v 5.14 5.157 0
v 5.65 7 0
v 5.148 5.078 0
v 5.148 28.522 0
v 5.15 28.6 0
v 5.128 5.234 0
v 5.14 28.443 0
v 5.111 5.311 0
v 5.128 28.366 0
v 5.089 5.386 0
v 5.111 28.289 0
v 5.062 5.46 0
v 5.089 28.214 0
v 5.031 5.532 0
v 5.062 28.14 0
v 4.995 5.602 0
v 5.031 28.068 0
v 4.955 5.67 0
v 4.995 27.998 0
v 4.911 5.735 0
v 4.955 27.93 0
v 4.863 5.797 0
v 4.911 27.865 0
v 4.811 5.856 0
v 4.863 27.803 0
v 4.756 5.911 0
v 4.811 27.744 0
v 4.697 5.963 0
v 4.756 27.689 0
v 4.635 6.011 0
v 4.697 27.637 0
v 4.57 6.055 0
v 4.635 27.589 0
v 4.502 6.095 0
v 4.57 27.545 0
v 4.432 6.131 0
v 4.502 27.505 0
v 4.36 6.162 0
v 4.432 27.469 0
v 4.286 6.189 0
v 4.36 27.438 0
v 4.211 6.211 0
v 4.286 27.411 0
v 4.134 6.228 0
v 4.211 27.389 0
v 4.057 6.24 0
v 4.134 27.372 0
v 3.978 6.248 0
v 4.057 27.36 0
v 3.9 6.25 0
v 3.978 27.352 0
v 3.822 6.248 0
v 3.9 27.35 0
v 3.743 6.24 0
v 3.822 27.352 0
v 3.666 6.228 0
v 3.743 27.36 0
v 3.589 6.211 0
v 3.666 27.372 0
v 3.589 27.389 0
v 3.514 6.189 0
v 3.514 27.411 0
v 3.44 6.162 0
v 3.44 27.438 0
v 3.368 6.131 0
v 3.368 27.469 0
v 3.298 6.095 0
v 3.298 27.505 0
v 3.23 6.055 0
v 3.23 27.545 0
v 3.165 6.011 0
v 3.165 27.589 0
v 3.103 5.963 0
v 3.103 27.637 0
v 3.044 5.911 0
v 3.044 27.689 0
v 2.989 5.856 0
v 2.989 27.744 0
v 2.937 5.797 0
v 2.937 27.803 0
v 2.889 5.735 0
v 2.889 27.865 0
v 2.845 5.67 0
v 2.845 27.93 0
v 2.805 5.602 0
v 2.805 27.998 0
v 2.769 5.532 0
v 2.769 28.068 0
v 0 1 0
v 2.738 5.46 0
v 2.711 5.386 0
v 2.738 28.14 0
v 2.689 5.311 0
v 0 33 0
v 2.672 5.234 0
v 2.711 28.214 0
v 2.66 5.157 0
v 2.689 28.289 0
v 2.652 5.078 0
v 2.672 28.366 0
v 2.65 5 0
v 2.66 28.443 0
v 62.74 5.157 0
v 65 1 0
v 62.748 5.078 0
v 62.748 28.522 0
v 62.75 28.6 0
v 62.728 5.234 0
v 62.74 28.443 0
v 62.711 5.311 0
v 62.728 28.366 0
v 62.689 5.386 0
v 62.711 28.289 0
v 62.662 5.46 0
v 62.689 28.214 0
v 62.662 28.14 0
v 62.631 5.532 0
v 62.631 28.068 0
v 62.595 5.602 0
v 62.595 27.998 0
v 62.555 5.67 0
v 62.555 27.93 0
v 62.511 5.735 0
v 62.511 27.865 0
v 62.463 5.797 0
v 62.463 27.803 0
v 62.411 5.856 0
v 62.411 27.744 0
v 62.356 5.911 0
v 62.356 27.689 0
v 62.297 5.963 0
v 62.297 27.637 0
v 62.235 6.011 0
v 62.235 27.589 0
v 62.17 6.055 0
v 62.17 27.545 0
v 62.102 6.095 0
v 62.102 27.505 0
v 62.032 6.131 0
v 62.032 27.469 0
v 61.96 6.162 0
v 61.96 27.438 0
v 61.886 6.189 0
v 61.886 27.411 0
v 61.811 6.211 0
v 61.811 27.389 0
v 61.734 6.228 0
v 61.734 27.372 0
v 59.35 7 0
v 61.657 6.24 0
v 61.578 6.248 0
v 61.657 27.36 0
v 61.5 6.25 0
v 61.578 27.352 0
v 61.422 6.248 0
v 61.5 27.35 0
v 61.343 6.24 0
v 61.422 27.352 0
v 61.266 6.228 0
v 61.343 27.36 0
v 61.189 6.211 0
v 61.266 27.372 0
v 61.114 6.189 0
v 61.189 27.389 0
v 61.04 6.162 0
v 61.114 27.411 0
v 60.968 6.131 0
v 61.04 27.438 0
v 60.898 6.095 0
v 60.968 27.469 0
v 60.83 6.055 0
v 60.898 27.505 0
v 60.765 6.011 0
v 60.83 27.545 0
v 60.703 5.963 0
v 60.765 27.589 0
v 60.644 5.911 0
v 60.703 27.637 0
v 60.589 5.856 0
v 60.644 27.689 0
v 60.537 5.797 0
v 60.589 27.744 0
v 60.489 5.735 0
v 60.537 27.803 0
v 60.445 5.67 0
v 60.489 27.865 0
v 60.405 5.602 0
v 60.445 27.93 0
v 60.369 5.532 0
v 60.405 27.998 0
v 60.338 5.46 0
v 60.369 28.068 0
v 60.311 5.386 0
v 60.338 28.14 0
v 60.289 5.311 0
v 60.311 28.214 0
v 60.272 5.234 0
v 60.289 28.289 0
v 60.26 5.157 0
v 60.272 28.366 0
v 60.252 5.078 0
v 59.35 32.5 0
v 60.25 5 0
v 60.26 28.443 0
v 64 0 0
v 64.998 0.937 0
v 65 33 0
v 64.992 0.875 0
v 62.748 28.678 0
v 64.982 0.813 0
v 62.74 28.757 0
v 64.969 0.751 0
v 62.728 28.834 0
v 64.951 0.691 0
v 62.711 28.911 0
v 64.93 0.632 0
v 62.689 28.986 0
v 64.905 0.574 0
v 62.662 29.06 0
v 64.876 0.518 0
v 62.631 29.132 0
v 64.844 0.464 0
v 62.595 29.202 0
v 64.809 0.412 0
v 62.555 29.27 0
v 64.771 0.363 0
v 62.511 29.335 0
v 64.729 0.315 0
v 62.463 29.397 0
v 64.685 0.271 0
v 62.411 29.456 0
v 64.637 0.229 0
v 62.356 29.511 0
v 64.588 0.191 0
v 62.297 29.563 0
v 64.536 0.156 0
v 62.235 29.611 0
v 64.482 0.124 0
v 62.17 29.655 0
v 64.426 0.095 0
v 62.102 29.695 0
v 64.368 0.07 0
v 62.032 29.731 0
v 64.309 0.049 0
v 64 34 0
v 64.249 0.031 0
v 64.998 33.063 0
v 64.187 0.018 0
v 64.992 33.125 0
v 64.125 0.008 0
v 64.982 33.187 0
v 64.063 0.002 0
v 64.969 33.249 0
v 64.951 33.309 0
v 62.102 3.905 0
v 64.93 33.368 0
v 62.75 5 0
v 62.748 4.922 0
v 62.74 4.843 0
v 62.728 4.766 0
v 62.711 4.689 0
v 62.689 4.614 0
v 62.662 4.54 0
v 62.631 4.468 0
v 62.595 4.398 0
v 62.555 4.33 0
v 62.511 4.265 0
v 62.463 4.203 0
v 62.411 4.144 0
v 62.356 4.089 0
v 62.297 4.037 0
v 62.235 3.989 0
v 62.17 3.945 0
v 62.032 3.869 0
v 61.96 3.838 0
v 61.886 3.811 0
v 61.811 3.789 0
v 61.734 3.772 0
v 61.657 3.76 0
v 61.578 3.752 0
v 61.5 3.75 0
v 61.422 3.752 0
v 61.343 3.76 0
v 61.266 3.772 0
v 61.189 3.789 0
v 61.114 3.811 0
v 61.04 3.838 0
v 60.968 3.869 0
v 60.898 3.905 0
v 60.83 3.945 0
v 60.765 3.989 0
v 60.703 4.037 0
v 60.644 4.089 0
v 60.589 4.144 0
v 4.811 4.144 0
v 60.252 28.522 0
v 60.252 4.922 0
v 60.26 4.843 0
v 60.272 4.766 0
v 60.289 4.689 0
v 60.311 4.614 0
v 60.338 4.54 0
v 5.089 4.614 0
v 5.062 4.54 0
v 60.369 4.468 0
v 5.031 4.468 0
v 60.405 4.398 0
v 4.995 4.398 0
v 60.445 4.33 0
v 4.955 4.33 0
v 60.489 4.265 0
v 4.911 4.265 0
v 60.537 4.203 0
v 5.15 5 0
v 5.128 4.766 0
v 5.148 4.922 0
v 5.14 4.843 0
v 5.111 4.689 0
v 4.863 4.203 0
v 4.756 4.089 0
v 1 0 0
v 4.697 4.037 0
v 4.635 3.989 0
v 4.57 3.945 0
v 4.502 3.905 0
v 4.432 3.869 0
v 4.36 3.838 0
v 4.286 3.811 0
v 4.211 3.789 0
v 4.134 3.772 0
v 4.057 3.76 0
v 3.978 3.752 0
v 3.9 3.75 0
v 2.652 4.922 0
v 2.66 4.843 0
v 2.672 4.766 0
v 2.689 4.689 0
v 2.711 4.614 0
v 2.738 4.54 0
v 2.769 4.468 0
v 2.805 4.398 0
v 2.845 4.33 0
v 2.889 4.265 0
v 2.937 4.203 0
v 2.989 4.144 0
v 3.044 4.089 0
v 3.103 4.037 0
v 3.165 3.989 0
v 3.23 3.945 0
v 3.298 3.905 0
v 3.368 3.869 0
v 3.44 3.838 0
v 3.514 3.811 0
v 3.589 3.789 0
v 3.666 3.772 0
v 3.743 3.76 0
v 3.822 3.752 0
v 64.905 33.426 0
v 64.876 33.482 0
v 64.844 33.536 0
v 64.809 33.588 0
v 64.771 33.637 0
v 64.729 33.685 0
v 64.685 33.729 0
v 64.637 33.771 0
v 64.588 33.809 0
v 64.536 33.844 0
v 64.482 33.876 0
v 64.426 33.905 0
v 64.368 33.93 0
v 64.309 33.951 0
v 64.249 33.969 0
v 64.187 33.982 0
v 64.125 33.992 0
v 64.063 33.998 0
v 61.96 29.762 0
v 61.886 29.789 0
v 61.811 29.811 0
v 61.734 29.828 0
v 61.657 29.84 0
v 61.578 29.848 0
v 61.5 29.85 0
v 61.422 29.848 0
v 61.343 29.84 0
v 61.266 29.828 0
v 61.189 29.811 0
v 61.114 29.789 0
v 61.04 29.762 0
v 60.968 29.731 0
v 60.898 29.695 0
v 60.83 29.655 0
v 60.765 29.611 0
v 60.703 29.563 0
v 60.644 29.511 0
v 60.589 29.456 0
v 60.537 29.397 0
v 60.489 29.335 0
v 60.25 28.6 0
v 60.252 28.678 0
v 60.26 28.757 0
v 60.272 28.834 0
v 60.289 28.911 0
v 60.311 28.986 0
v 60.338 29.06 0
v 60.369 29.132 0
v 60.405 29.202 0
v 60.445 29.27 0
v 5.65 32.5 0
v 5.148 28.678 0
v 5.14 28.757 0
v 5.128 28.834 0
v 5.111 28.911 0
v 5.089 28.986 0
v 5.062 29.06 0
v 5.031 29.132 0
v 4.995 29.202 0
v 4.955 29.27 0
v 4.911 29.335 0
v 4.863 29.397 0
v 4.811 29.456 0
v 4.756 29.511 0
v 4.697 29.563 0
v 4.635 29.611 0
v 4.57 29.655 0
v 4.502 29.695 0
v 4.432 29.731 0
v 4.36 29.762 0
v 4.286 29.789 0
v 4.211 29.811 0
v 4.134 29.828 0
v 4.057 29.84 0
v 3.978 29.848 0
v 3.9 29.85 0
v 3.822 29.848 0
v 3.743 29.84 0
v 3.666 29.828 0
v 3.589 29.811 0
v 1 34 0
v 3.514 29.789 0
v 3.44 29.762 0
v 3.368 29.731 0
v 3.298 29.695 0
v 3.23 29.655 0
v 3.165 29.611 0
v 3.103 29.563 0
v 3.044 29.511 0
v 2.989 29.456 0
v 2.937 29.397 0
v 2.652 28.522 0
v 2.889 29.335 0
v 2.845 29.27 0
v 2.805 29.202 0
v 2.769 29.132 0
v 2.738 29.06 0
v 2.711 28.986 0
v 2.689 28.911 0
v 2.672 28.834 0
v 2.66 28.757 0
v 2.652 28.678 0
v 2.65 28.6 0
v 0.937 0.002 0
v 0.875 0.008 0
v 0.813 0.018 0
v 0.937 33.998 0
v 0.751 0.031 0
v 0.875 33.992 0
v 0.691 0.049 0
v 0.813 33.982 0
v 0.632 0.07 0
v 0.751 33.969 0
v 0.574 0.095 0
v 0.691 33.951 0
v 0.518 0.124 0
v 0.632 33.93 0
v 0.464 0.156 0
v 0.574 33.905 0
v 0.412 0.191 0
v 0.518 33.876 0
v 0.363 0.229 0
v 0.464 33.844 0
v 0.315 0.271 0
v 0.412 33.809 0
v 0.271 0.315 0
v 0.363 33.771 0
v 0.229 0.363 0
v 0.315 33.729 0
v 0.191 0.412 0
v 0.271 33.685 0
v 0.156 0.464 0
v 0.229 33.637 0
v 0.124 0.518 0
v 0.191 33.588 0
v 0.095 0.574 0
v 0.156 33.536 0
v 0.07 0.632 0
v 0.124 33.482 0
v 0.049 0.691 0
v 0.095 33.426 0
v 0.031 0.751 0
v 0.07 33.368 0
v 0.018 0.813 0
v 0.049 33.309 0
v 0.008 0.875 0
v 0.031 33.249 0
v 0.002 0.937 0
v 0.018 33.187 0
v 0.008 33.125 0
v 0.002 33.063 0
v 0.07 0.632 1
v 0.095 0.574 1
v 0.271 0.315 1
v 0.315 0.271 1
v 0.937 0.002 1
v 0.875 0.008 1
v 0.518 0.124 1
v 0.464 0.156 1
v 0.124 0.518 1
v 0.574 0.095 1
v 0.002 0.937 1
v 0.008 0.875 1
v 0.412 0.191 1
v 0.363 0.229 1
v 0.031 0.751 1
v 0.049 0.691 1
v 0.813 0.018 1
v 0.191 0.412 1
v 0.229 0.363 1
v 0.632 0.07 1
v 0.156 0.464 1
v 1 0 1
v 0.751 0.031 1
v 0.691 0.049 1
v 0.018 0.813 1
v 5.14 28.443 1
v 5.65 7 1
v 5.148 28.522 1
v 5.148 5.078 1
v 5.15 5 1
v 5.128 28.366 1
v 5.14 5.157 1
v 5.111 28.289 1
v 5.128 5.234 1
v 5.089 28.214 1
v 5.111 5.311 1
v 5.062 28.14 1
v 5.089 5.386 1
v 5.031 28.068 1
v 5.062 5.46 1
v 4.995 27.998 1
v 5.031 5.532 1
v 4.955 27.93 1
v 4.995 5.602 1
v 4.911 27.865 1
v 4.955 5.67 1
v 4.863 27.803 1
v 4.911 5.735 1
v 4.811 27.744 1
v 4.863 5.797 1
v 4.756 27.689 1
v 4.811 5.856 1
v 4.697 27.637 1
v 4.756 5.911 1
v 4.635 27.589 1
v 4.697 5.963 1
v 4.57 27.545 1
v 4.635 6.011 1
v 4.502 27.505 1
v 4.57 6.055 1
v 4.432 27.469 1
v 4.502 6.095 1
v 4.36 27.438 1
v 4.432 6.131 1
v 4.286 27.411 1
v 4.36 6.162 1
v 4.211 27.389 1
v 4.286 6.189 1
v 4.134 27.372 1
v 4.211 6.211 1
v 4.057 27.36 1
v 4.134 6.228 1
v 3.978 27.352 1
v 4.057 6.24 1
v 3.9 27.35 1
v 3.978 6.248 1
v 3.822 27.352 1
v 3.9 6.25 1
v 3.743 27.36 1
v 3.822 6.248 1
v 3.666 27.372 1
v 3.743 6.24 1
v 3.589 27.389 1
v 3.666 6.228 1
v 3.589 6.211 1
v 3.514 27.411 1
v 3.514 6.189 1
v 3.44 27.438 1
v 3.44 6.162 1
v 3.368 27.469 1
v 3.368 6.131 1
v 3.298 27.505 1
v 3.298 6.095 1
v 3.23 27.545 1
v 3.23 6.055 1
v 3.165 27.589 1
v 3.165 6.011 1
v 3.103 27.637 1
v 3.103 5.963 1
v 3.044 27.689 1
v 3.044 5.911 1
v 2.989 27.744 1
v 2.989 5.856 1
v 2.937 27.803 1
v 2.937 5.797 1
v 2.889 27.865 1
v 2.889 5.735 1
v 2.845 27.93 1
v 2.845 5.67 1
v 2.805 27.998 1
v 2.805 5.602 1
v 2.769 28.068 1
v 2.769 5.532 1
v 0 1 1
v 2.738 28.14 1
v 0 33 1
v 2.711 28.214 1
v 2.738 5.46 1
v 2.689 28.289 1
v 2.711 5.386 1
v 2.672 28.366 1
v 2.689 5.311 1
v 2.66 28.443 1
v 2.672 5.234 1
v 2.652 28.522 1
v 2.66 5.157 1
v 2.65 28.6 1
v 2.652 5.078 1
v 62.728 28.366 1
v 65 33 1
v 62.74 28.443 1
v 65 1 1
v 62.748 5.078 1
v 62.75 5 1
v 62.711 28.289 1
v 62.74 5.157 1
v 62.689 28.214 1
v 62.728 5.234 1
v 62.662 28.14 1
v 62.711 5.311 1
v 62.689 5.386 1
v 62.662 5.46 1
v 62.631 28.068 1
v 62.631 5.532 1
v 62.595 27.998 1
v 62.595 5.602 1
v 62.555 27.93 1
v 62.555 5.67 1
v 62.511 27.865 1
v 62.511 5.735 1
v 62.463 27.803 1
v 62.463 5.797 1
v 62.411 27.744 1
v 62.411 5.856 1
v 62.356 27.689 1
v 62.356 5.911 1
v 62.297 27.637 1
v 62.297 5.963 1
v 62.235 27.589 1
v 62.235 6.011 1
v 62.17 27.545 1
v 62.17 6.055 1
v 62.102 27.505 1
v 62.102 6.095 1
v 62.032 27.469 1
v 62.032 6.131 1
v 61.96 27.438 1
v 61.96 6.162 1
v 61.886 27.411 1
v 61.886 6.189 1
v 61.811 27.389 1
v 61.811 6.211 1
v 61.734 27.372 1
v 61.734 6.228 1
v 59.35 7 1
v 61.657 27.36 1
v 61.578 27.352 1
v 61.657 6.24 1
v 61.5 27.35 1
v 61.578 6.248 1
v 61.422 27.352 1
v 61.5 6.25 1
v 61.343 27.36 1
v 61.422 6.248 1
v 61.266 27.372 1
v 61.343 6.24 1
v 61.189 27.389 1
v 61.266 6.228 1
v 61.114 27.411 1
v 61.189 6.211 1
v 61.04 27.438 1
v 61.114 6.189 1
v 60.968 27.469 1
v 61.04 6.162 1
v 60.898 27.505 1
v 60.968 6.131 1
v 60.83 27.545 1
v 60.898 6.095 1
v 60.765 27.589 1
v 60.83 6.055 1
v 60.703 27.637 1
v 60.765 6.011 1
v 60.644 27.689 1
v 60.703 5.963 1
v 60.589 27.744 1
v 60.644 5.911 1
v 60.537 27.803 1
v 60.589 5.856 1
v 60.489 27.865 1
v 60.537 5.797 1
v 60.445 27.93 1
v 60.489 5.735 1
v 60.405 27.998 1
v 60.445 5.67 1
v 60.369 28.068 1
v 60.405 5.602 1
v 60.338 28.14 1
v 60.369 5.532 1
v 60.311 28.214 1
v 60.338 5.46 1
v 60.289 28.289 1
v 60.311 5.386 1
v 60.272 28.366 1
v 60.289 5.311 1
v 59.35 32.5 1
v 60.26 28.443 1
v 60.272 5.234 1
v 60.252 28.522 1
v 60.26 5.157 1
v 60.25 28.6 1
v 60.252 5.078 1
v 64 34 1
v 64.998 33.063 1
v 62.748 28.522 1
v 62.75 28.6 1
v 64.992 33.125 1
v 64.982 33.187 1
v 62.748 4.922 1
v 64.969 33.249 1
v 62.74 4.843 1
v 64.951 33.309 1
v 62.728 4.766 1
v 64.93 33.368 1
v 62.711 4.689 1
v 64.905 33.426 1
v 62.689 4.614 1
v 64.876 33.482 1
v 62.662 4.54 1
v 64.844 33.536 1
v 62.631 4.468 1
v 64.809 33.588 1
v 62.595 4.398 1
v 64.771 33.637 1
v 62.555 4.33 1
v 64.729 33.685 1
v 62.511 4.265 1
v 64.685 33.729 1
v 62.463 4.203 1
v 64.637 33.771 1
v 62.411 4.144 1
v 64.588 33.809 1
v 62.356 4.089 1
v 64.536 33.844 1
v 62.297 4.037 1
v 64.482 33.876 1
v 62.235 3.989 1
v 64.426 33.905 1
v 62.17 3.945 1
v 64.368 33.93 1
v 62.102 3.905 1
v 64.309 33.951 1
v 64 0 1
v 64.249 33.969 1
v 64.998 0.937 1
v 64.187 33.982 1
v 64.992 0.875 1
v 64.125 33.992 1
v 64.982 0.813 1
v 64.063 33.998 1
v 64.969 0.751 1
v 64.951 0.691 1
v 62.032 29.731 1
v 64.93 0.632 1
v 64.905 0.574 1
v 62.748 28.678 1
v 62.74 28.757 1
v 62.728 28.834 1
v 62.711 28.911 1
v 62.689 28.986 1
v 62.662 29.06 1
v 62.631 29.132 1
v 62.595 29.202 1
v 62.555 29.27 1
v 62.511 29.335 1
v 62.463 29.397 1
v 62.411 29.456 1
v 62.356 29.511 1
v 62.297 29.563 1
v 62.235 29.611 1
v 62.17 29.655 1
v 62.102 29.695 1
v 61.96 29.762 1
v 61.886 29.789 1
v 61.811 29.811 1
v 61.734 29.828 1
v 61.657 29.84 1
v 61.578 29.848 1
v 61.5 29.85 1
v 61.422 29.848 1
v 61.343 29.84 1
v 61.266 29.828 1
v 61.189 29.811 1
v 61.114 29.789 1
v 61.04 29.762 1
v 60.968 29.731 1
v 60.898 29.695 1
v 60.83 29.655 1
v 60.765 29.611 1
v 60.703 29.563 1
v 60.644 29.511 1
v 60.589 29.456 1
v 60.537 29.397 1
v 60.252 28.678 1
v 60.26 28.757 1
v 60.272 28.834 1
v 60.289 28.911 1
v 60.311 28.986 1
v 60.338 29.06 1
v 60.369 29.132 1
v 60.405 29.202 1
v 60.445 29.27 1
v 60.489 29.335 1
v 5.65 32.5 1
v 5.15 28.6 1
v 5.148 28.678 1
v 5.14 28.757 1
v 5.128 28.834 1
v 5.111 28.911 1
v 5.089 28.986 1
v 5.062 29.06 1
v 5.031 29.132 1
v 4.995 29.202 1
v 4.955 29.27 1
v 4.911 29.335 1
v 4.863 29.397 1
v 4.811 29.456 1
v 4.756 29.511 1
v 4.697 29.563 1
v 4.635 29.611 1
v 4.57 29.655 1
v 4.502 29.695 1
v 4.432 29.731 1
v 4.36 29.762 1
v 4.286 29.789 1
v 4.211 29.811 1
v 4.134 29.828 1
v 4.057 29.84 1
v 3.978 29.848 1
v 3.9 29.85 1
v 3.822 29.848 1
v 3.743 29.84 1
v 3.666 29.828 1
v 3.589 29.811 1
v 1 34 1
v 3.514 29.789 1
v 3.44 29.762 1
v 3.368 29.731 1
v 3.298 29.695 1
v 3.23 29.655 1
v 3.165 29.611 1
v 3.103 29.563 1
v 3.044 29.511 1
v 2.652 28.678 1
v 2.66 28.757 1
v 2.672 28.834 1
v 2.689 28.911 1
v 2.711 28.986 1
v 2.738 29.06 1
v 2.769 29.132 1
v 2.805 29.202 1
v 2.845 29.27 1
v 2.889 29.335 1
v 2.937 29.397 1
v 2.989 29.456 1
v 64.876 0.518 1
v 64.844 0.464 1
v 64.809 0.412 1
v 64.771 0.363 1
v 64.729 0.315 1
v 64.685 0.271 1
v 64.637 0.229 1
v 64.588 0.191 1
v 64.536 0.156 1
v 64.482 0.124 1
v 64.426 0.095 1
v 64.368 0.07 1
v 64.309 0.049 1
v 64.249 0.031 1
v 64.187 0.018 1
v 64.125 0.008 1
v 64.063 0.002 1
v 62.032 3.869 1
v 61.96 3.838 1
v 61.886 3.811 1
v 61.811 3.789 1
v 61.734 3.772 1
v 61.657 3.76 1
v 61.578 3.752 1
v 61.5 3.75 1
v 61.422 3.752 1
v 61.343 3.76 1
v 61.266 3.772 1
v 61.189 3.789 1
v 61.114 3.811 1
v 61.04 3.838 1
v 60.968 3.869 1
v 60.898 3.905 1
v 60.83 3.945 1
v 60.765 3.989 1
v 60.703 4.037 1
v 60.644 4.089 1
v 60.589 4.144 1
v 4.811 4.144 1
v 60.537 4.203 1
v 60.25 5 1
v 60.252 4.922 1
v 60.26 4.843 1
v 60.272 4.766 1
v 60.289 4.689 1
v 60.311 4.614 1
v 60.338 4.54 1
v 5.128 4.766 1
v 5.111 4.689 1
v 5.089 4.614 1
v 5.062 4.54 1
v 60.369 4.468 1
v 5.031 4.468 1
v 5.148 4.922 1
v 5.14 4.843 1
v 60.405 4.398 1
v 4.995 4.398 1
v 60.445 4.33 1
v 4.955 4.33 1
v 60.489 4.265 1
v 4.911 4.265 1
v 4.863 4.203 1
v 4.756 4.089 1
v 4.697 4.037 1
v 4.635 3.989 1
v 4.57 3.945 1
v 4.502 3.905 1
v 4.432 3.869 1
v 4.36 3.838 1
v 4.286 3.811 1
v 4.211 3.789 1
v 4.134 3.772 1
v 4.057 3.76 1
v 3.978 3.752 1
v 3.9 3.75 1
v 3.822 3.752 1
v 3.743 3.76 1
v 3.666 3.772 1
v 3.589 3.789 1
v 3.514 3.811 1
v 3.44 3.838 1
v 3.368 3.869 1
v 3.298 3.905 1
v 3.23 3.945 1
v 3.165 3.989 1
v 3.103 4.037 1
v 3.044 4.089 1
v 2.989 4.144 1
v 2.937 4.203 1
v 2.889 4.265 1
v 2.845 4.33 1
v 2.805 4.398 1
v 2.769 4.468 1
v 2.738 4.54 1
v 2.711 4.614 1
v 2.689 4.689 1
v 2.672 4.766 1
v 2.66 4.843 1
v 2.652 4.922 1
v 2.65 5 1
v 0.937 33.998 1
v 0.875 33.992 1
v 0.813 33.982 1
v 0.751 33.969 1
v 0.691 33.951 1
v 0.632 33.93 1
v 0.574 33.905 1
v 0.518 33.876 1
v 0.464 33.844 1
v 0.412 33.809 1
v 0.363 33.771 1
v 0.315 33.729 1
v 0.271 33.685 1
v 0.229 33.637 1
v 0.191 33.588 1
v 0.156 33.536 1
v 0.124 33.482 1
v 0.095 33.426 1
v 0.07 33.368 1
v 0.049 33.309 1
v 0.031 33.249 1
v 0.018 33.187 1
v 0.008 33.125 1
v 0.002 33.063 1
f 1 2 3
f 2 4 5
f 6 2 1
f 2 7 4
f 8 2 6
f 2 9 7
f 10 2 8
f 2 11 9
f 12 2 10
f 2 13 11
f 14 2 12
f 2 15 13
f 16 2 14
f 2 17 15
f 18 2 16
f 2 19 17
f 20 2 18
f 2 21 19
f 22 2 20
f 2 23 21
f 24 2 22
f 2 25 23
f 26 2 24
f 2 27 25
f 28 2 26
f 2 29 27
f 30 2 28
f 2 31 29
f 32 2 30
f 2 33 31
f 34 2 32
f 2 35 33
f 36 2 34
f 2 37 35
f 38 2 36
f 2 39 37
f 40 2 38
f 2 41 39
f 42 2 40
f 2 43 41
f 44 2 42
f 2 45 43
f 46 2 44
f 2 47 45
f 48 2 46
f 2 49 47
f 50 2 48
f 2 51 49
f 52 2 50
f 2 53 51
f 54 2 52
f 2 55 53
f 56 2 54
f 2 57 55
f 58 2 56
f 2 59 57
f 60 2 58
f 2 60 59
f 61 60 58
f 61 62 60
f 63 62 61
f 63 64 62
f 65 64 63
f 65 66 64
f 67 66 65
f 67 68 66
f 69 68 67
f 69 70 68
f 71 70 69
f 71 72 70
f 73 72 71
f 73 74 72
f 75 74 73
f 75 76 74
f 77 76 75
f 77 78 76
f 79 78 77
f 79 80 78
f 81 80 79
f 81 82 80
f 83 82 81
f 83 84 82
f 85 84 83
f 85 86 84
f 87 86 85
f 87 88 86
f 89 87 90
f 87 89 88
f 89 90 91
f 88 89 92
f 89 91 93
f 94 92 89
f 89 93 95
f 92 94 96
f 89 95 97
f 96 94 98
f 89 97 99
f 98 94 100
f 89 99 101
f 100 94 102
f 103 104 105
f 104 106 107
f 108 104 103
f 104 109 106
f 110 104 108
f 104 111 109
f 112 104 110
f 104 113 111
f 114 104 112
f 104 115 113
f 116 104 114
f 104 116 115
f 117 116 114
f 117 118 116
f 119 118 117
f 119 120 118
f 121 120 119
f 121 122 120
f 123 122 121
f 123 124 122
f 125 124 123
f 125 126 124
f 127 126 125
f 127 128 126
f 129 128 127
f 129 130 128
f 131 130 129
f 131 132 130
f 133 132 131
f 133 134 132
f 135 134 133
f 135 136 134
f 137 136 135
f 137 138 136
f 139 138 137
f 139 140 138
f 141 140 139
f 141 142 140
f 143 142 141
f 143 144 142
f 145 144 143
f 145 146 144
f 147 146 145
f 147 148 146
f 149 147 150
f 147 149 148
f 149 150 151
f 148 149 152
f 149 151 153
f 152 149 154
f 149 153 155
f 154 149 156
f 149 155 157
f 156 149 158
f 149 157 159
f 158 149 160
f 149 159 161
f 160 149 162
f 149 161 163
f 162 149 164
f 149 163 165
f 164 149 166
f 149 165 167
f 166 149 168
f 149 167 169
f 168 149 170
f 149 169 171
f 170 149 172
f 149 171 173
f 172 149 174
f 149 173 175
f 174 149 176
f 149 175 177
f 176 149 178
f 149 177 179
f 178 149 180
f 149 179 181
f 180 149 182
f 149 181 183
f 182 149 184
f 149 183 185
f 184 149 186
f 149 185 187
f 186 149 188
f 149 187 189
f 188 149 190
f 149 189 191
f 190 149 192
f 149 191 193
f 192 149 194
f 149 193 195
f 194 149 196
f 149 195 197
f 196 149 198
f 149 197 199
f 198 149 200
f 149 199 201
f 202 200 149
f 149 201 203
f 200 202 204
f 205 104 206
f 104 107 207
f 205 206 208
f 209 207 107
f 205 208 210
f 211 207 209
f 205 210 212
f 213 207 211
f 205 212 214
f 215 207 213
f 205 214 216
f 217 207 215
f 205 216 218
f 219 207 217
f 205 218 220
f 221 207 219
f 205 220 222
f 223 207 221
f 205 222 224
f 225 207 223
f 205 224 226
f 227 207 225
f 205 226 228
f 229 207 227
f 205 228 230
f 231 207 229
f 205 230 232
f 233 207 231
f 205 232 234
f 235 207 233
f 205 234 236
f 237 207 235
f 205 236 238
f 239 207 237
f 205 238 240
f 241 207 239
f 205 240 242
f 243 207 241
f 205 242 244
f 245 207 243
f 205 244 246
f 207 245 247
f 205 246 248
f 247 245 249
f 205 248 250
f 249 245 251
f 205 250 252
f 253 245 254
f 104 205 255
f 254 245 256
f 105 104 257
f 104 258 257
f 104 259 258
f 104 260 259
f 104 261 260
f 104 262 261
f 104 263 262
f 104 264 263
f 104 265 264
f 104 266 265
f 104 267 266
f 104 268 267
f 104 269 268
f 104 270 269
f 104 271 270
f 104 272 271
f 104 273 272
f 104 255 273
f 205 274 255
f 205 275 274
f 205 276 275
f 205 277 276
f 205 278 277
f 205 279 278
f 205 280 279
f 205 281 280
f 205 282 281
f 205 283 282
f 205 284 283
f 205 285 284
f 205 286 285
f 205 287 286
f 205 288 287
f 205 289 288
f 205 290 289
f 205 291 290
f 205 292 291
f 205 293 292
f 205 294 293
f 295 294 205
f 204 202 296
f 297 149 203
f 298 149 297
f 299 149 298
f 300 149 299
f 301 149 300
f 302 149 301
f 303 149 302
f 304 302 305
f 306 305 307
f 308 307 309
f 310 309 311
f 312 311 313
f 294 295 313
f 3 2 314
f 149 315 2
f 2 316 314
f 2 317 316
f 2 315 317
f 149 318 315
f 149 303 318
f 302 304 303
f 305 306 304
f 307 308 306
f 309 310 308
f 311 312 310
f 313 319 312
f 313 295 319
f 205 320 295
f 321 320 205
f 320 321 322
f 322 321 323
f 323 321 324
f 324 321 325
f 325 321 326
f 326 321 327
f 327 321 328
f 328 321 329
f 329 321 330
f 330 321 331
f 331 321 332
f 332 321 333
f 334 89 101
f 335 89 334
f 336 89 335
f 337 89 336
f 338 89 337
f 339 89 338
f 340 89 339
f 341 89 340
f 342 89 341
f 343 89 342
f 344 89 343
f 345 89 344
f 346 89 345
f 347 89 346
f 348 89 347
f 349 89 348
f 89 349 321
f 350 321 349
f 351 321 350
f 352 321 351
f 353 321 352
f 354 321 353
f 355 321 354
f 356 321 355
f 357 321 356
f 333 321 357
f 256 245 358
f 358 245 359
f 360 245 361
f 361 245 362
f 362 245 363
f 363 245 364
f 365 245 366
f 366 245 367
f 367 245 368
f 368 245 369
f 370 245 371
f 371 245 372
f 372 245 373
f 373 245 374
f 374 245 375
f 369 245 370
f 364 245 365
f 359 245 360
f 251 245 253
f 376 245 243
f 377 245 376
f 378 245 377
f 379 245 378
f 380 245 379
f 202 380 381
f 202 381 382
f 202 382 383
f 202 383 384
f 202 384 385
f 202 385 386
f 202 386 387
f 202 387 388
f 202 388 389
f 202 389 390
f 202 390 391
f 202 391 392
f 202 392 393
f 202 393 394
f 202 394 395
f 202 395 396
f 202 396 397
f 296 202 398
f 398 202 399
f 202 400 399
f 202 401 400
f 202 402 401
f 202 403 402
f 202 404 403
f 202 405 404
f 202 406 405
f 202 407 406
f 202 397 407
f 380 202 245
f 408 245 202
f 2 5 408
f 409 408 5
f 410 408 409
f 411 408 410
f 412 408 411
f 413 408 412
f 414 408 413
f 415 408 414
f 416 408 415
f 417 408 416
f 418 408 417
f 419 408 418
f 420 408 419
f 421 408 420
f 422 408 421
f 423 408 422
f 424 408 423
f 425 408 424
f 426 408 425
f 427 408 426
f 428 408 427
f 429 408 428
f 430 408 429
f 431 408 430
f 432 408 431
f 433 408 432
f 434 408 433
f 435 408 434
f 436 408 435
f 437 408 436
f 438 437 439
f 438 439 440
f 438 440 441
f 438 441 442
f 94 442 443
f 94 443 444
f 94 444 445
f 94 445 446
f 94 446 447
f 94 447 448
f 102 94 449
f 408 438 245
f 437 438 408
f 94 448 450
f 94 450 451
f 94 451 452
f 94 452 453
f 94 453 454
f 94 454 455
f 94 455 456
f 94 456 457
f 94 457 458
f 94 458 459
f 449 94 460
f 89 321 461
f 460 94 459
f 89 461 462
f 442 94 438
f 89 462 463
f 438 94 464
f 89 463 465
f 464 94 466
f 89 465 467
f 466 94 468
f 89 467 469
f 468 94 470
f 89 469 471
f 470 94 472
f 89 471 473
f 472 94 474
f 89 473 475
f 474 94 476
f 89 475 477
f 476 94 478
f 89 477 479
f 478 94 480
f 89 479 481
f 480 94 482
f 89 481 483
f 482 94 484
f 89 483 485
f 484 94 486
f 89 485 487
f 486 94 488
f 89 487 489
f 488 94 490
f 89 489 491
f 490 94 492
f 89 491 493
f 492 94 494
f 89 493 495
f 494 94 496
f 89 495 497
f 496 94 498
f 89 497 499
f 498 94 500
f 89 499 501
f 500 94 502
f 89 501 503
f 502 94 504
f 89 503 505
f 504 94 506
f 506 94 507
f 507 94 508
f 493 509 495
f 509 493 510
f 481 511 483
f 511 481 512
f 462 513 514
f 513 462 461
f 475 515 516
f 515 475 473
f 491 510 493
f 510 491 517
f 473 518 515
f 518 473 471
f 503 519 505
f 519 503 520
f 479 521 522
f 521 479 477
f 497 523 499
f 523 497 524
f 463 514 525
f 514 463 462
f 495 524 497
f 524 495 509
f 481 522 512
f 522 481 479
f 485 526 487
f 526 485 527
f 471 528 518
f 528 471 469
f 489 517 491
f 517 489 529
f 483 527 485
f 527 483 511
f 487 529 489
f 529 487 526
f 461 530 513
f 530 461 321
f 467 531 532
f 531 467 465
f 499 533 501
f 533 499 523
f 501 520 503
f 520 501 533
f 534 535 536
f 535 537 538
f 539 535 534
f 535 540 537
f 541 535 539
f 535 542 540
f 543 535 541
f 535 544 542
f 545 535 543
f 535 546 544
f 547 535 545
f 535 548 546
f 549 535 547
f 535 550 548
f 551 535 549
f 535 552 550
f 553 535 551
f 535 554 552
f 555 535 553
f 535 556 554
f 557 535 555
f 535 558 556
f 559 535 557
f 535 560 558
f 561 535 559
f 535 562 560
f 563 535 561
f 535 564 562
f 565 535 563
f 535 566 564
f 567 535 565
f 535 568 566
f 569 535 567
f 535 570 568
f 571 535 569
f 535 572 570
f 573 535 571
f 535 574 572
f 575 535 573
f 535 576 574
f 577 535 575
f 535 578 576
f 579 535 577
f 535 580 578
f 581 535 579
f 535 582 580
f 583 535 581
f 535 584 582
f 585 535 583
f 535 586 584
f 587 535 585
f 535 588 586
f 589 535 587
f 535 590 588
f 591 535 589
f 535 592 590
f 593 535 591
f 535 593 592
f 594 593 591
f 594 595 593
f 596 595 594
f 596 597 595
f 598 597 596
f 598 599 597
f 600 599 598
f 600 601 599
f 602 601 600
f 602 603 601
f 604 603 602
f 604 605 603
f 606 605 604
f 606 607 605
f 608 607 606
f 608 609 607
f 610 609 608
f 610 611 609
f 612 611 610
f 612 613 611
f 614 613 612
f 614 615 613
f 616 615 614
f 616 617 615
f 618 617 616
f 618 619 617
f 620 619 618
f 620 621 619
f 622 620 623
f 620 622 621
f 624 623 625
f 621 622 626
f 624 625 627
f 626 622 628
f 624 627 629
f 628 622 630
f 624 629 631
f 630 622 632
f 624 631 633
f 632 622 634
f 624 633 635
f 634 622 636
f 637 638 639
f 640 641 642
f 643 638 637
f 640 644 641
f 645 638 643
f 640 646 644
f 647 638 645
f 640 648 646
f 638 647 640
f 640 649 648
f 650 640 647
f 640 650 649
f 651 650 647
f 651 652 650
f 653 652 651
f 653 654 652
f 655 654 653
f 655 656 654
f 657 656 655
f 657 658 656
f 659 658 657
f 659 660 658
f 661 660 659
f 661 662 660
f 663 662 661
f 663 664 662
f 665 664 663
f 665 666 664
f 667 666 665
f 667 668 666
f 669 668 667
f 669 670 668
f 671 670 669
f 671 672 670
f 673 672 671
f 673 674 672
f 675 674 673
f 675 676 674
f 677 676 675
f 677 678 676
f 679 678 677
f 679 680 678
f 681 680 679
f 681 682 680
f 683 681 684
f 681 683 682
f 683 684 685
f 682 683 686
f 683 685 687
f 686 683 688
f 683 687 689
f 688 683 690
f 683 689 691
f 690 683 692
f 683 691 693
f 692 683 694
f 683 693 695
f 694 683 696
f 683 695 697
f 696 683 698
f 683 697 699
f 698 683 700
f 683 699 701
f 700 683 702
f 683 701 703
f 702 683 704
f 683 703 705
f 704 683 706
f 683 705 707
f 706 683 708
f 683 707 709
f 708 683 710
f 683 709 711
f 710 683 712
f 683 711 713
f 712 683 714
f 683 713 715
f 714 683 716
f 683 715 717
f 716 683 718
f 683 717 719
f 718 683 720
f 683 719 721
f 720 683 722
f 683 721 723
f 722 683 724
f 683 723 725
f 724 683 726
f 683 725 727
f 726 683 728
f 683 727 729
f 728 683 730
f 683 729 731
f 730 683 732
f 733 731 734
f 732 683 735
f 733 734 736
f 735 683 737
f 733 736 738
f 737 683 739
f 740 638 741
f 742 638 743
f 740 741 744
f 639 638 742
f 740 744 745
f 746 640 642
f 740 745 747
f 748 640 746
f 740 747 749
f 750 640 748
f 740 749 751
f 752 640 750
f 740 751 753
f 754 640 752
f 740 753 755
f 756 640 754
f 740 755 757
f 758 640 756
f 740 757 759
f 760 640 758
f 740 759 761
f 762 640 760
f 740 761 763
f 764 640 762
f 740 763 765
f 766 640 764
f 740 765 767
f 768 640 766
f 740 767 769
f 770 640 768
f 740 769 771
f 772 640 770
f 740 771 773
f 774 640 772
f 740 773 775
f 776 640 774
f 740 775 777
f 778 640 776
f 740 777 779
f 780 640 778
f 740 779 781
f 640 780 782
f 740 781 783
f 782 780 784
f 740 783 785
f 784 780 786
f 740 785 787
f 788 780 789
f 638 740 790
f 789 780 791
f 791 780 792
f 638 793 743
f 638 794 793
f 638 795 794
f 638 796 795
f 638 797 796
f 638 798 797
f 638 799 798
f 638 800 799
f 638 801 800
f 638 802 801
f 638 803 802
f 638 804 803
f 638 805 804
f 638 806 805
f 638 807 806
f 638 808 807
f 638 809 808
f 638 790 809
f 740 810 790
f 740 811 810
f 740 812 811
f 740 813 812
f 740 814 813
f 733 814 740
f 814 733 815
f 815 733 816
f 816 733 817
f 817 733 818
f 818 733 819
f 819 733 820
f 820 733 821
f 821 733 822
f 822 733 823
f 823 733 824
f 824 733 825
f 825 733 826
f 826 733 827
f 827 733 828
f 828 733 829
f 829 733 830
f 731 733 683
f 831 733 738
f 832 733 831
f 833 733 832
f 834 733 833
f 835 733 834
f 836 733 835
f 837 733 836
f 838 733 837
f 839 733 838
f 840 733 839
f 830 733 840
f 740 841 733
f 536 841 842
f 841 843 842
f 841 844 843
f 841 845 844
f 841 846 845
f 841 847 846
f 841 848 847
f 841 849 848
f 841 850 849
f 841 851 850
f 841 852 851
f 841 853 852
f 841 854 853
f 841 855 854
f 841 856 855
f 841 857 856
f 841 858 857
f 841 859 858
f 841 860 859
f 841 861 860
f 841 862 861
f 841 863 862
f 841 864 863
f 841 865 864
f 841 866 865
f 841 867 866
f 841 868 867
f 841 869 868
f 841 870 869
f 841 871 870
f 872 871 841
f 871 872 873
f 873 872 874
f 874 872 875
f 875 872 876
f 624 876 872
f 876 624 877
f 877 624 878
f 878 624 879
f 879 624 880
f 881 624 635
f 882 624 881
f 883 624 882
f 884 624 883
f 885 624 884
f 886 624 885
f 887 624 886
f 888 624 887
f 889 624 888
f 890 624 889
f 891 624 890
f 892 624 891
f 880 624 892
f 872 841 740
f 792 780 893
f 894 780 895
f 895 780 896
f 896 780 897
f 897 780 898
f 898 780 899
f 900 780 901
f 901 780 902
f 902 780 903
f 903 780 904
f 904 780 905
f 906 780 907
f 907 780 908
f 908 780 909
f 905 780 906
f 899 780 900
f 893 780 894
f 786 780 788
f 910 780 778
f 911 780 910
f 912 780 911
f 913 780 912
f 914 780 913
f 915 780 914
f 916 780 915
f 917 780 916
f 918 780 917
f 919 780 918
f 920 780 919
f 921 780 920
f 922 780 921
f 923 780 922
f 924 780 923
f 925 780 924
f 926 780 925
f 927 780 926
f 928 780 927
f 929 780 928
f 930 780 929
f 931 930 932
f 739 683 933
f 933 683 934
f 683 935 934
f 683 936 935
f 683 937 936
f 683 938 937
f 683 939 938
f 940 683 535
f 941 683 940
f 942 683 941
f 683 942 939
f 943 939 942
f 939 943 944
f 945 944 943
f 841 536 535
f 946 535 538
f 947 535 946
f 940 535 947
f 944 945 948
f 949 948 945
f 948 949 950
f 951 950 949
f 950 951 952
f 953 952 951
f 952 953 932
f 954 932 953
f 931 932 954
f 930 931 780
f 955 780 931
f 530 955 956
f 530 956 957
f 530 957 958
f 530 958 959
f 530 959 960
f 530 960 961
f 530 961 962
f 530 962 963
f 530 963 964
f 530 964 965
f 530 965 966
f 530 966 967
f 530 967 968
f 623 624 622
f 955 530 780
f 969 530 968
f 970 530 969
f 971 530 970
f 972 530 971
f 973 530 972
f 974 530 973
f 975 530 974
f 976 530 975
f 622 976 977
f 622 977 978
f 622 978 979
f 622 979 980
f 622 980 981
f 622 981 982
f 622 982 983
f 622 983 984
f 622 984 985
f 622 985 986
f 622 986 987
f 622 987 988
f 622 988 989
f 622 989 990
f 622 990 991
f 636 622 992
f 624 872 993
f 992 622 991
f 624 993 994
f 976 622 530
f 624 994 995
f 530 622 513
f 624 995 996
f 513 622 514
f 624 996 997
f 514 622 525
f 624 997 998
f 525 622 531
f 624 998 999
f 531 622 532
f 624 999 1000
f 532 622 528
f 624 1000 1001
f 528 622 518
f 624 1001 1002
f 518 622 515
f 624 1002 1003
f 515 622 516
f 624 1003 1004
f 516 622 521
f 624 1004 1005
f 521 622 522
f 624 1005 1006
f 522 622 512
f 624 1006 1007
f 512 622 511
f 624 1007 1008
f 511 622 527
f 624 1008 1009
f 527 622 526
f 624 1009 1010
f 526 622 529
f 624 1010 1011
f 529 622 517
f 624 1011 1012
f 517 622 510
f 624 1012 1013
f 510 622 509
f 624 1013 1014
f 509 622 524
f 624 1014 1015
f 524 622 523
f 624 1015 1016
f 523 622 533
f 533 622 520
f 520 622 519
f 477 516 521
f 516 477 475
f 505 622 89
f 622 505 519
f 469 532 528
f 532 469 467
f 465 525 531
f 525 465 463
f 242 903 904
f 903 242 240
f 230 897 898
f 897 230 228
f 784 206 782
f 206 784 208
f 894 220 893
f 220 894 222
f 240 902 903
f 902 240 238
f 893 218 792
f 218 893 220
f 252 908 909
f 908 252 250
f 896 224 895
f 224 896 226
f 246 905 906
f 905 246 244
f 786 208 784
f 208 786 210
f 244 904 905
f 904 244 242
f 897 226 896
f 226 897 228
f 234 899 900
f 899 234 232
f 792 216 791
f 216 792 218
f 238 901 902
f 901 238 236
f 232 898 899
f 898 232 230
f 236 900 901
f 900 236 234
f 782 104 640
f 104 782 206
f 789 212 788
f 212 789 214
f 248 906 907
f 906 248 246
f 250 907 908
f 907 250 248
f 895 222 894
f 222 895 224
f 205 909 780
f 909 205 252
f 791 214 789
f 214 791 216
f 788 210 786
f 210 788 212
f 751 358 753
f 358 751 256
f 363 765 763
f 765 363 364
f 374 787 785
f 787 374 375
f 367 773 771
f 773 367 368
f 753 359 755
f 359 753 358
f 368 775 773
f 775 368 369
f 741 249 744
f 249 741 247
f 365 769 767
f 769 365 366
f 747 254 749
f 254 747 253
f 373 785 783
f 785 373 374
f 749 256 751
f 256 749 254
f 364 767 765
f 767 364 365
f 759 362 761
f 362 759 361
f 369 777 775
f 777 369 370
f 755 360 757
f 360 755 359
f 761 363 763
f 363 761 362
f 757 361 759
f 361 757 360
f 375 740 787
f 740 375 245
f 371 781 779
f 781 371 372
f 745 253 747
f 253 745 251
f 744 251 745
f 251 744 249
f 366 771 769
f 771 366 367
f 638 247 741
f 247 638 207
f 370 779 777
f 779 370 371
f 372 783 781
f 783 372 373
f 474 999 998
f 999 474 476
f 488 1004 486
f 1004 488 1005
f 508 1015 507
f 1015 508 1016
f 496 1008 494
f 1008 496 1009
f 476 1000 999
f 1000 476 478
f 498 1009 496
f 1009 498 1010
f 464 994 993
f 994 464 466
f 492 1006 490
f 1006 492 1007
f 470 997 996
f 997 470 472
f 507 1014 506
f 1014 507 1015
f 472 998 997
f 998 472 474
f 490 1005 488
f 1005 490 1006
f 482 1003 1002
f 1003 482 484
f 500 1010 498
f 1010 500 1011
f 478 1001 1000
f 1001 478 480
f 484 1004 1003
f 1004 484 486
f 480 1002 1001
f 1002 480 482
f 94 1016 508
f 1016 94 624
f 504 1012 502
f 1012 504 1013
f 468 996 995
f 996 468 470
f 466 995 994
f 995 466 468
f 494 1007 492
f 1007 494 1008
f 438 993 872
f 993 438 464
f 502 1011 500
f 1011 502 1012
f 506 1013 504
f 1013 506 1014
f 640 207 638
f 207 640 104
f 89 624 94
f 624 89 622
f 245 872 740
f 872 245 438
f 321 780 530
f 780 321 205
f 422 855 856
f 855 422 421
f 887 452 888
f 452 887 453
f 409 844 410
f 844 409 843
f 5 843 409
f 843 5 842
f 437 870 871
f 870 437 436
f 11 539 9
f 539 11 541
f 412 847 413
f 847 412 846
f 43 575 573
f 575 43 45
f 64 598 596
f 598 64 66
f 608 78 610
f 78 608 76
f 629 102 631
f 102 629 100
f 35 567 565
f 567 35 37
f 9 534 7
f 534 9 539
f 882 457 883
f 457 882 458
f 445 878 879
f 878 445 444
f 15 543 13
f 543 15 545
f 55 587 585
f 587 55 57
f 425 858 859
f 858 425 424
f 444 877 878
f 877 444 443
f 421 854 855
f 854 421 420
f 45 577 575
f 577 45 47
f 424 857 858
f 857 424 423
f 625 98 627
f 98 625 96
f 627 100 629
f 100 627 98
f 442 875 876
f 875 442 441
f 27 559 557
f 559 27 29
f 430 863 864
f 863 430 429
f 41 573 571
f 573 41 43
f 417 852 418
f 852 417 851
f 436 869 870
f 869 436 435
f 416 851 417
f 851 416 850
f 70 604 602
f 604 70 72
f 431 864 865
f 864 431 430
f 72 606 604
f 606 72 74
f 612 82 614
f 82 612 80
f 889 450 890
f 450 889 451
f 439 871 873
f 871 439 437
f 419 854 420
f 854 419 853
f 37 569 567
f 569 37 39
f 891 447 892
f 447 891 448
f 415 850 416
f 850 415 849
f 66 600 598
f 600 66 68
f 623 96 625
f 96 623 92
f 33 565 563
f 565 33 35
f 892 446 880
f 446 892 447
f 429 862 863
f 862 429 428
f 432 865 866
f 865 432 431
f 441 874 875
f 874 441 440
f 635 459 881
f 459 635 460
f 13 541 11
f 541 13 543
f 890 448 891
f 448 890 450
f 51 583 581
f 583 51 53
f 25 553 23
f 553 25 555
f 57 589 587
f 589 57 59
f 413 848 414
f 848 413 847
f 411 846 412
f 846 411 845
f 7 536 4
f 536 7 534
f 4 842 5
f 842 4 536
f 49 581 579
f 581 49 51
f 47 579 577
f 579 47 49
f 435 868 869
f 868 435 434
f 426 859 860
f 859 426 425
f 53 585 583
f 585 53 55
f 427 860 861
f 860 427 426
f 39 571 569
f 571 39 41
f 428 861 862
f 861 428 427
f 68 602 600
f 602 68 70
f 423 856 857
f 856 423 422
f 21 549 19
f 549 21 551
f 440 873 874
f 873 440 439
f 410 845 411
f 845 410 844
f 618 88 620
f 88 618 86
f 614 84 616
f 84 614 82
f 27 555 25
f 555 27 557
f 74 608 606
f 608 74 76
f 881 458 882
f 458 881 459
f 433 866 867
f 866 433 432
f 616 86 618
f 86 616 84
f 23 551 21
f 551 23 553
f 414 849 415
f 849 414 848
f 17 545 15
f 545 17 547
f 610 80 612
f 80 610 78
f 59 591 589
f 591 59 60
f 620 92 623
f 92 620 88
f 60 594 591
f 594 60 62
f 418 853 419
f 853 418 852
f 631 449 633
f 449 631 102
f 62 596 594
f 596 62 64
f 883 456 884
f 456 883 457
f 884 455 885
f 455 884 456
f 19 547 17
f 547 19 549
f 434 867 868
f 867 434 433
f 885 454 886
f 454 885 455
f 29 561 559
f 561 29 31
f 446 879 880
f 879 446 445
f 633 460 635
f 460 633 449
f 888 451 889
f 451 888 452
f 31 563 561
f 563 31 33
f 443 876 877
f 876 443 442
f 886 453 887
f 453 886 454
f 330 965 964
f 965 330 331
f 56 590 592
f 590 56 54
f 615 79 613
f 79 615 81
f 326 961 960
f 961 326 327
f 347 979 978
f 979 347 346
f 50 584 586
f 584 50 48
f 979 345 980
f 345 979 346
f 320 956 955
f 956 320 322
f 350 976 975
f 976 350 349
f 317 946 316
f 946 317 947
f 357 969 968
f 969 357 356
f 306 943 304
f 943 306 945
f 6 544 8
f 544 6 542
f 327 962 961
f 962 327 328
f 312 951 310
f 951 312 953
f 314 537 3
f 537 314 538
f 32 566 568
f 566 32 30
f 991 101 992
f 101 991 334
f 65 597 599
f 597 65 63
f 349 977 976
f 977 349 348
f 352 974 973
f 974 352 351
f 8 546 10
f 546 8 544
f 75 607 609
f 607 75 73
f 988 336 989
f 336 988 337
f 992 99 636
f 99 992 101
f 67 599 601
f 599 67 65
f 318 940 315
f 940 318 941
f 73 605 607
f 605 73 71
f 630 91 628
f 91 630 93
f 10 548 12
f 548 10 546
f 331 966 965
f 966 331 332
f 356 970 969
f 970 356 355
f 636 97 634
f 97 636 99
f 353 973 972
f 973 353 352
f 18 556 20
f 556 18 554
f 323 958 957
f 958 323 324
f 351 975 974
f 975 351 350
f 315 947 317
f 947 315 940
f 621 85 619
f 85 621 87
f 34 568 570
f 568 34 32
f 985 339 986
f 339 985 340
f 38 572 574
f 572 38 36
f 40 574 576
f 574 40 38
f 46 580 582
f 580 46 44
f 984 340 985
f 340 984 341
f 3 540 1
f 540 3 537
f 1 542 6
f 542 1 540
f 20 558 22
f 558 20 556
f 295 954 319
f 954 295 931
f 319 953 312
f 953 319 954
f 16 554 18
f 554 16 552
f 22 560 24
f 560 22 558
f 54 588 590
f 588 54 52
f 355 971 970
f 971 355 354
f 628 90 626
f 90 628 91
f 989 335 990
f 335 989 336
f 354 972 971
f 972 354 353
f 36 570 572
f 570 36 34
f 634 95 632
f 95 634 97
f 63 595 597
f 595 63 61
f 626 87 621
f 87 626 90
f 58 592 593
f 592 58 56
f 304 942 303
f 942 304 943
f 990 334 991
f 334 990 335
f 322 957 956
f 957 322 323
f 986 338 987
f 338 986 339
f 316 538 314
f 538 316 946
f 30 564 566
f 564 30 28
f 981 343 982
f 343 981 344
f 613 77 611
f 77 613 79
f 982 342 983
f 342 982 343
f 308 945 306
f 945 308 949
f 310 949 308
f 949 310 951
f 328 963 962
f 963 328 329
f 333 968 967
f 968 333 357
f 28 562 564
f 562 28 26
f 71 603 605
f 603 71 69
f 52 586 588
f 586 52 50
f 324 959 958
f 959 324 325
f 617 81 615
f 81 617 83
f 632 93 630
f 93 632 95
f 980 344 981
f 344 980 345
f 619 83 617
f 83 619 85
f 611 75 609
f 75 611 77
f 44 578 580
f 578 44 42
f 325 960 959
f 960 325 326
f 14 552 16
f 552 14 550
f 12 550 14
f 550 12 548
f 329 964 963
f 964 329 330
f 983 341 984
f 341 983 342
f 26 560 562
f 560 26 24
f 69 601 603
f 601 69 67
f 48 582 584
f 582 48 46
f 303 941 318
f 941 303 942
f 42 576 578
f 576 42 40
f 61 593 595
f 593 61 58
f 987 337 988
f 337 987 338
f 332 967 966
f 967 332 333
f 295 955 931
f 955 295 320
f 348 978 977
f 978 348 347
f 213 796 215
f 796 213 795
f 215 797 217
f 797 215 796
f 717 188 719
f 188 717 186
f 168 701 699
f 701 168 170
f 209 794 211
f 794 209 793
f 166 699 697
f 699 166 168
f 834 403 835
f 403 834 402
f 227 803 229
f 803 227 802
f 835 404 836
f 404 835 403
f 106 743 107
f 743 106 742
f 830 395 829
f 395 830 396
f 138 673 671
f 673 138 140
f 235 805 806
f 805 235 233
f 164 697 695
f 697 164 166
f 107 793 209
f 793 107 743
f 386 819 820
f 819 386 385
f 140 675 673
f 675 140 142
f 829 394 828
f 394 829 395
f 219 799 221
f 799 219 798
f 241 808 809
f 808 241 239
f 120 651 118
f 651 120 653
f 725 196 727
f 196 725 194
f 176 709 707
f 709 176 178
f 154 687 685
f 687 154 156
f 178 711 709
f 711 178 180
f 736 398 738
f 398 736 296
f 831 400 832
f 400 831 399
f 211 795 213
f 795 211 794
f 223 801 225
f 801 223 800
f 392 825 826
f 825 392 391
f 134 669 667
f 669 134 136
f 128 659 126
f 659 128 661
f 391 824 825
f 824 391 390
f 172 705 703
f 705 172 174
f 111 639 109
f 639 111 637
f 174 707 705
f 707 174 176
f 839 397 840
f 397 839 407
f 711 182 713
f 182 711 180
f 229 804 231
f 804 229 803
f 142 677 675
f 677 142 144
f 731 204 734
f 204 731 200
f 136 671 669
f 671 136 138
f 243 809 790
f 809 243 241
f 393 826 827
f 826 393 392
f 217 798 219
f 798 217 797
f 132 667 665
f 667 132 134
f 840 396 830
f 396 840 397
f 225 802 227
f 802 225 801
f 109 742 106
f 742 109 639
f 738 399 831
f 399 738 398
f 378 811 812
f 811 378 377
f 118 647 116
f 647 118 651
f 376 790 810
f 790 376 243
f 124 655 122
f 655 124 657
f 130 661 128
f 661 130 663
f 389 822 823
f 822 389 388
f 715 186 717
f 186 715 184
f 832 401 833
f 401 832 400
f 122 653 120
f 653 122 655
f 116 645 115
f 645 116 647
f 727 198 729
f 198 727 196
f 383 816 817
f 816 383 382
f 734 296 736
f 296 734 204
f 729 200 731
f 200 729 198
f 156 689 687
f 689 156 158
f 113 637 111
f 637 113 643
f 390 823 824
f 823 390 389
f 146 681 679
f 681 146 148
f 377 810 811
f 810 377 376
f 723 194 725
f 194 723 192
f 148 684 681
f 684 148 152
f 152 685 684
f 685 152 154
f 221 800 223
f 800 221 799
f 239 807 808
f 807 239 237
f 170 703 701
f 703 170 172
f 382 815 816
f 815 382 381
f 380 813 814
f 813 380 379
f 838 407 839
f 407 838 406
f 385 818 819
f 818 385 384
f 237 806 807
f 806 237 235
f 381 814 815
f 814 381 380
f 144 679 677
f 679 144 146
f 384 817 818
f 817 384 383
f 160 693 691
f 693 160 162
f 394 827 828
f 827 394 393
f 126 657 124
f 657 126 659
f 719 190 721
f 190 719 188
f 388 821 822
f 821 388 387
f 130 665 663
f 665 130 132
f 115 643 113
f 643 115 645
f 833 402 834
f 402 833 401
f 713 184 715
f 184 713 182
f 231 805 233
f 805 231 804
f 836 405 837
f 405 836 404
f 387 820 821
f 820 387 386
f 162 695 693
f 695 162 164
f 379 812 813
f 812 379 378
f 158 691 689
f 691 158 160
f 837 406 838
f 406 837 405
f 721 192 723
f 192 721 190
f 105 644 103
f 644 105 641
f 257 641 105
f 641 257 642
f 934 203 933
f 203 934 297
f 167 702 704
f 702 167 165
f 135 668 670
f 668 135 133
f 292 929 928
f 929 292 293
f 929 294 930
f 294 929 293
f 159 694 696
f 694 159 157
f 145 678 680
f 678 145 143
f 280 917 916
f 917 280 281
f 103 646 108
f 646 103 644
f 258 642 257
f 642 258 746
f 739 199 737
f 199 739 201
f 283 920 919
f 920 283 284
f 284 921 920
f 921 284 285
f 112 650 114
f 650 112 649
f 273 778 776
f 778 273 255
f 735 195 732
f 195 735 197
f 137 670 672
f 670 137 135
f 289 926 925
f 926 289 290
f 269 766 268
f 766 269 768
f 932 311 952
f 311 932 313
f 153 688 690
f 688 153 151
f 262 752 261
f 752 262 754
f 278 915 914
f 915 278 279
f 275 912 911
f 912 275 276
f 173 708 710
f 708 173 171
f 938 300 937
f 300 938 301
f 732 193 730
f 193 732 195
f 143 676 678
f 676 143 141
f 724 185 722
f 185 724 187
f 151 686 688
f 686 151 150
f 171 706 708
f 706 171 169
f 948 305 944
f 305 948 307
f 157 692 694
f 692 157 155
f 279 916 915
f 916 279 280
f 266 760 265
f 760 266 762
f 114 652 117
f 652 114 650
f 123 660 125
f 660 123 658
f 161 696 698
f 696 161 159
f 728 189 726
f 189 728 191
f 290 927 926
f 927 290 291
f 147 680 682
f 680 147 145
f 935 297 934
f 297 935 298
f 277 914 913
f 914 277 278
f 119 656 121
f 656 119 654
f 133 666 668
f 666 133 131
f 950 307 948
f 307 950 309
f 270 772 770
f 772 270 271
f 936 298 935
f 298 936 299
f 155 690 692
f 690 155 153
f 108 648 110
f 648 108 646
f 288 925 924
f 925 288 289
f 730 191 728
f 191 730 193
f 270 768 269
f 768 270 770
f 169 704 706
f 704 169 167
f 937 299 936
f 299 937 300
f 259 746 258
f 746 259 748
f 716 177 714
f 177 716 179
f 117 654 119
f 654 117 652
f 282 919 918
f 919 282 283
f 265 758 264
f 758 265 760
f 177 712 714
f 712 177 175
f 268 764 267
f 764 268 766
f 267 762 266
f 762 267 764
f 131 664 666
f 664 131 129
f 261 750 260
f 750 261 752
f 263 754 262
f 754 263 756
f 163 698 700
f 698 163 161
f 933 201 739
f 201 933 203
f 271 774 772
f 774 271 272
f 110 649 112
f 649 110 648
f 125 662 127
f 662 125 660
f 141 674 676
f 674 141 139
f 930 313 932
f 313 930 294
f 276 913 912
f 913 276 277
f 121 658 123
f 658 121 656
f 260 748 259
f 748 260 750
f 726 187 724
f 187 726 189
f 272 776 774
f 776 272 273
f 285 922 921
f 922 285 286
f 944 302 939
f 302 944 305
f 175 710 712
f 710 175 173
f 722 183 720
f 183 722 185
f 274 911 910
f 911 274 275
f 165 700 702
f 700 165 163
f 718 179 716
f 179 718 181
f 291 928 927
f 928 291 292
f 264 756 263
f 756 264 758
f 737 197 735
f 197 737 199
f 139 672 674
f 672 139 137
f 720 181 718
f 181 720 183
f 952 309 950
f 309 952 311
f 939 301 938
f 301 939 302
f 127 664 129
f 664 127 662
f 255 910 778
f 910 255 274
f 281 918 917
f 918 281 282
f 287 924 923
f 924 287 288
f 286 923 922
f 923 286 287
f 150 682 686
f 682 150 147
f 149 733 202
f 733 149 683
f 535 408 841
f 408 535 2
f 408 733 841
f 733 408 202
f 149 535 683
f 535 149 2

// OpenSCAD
// file: modules/rcube.scad
$fn = 100;

// example: rcube([10,15,1], 1);

module rcube(xyz, rr) {

    xx = xyz[0];
    yy = xyz[1];
    zz = xyz[2];

    difference(){
        cube([xx, yy, zz]);

        difference(){
            translate([-0.5, -0.5, -0.2])
            cube([rr+0.5, rr+0.5, zz+0.5]);

            translate([rr, rr, zz/2])
            cylinder(zz, rr, rr, true);
        }

        translate([xx, 0, 0]) rotate(90) difference() {
            translate([-0.5, -0.5, -0.2])
                cube([rr+0.5, rr+0.5, zz+0.5]);

            translate([rr, rr, zz/2])
                cylinder(zz, rr, rr, true);
        }

        translate([xx, yy, 0]) rotate(180) difference() {
            translate([-0.5, -0.5, -0.2])
                cube([rr+0.5, rr+0.5, zz+0.5]);

            translate([rr, rr, zz/2])
                cylinder(zz, rr, rr, true);
        }

        translate([0, yy, 0]) rotate(270) difference() {
            translate([-0.5, -0.5, -0.2])
                cube([rr+0.5, rr+0.5, zz+0.5]);

            translate([rr, rr, zz/2])
                cylinder(zz, rr, rr, true);
        }
    }
}
// main file
include <modules/rcube.scad>

difference() {
    rcube([65,34,1], 1);

    translate([3.9, 28.6, -1]) cylinder(d=2.5, h=3); // top left
    translate([3.9,  5, -1]) cylinder(d=2.5, h=3); // bottom left
    
    translate([61.5,  28.6, -1]) cylinder(d=2.5, h=3); // top right
    translate([61.5,  5, -1]) cylinder(d=2.5, h=3); // bottom right

    translate([5.65,7,-1]) cube([53.7,25.5,3]);
}
